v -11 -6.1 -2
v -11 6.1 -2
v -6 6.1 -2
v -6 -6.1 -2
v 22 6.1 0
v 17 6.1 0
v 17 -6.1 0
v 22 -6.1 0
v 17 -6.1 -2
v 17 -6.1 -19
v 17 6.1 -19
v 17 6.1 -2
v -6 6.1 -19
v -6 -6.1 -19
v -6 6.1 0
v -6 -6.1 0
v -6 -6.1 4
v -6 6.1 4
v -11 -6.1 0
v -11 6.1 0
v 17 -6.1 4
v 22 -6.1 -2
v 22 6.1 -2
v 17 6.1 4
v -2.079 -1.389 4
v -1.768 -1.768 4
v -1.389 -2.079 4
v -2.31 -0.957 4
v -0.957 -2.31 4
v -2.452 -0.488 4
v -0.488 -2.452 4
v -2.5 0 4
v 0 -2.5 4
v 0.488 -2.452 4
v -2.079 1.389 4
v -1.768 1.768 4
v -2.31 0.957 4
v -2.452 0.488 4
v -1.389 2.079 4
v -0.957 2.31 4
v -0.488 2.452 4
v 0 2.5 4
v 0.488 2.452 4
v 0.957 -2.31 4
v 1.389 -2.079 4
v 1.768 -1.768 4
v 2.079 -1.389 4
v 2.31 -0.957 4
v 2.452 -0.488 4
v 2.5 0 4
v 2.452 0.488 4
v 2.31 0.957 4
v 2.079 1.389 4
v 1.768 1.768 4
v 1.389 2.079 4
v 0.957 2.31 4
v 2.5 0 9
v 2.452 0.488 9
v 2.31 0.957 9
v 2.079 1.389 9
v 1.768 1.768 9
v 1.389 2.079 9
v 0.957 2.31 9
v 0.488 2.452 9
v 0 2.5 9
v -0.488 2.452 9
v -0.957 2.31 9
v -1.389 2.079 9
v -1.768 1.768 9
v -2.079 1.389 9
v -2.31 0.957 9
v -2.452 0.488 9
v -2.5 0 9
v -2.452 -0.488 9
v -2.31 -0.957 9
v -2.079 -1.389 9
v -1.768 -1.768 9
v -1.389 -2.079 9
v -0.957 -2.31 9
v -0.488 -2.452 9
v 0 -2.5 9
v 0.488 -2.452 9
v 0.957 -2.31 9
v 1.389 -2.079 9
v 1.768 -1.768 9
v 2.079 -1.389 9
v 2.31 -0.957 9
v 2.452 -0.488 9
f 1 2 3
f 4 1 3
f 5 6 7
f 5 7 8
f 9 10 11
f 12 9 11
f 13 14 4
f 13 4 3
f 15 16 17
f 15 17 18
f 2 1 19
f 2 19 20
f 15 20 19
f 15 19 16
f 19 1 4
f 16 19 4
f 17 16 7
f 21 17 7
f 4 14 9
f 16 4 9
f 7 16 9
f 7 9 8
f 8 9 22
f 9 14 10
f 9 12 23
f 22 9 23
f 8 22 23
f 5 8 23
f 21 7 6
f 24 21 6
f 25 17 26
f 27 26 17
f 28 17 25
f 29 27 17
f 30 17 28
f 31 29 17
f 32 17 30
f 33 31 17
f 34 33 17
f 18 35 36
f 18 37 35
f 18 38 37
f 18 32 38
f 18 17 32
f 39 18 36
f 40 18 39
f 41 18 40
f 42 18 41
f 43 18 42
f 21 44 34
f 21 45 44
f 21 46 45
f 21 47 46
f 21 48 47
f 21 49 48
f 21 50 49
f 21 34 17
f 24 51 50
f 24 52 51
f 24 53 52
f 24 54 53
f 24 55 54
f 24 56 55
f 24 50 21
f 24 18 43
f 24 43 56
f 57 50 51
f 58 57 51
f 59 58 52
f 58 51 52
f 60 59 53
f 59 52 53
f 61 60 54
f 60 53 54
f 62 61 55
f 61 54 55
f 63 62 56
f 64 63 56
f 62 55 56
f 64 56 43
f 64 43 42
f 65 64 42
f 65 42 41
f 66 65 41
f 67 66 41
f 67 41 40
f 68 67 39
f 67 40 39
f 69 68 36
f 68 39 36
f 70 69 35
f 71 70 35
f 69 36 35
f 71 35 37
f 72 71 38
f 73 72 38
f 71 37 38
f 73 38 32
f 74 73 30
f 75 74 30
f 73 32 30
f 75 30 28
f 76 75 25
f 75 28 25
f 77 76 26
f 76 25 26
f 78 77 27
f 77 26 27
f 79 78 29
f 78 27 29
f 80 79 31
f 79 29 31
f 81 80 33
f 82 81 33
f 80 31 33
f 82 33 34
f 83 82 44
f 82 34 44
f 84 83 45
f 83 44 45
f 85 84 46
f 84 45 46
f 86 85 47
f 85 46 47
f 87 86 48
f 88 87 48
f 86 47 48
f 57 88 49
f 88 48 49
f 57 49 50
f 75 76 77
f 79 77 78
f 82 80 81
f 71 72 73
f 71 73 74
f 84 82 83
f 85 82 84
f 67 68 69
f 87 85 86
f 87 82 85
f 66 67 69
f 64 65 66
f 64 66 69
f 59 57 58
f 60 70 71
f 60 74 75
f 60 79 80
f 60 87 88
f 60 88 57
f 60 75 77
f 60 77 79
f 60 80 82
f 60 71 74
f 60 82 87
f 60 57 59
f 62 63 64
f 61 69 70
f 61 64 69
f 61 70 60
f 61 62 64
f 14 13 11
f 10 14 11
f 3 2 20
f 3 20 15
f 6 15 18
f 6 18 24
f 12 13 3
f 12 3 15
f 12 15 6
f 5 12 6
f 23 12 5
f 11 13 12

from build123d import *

# Parameters (mm, degrees)
CASE_23X12P2X23_START                = -19
CASE_23X12P2X23_PROFILE_W            = 23
CASE_23X12P2X23_PROFILE_H            = 12.2
CASE_23X12P2X23_DEPTH                = 23
MOUNTING_EARS_33X12P2_START          = -2
MOUNTING_EARS_33X12P2_PROFILE_W      = 33
MOUNTING_EARS_33X12P2_PROFILE_H      = 12.2
MOUNTING_EARS_33X12P2_DEPTH          = 2
OUTPUT_ENVELOPE_NOT_SPLINE_START     = 4
OUTPUT_ENVELOPE_NOT_SPLINE_PROFILE_R = 2.5
OUTPUT_ENVELOPE_NOT_SPLINE_DEPTH     = 5


with BuildPart() as part:
    # Case_23x12p2x23_profile → Case_23x12p2x23 (new body)
    with BuildSketch(Plane.XY.offset(CASE_23X12P2X23_START)):
        with Locations((5.5, 0)):
            Rectangle(CASE_23X12P2X23_PROFILE_W, CASE_23X12P2X23_PROFILE_H)
    extrude(amount=CASE_23X12P2X23_DEPTH)

    # Mounting_ears_33x12p2_profile → Mounting_ears_33x12p2 (add)
    with BuildSketch(Plane.XY.offset(MOUNTING_EARS_33X12P2_START)):
        with Locations((5.5, 0)):
            Rectangle(MOUNTING_EARS_33X12P2_PROFILE_W, MOUNTING_EARS_33X12P2_PROFILE_H)
    extrude(amount=MOUNTING_EARS_33X12P2_DEPTH)

    # Output_envelope_not_spline_profile → Output_envelope_not_spline (add)
    with BuildSketch(Plane.XY.offset(OUTPUT_ENVELOPE_NOT_SPLINE_START)):
        Circle(OUTPUT_ENVELOPE_NOT_SPLINE_PROFILE_R)
    extrude(amount=OUTPUT_ENVELOPE_NOT_SPLINE_DEPTH)


solid = part.part
